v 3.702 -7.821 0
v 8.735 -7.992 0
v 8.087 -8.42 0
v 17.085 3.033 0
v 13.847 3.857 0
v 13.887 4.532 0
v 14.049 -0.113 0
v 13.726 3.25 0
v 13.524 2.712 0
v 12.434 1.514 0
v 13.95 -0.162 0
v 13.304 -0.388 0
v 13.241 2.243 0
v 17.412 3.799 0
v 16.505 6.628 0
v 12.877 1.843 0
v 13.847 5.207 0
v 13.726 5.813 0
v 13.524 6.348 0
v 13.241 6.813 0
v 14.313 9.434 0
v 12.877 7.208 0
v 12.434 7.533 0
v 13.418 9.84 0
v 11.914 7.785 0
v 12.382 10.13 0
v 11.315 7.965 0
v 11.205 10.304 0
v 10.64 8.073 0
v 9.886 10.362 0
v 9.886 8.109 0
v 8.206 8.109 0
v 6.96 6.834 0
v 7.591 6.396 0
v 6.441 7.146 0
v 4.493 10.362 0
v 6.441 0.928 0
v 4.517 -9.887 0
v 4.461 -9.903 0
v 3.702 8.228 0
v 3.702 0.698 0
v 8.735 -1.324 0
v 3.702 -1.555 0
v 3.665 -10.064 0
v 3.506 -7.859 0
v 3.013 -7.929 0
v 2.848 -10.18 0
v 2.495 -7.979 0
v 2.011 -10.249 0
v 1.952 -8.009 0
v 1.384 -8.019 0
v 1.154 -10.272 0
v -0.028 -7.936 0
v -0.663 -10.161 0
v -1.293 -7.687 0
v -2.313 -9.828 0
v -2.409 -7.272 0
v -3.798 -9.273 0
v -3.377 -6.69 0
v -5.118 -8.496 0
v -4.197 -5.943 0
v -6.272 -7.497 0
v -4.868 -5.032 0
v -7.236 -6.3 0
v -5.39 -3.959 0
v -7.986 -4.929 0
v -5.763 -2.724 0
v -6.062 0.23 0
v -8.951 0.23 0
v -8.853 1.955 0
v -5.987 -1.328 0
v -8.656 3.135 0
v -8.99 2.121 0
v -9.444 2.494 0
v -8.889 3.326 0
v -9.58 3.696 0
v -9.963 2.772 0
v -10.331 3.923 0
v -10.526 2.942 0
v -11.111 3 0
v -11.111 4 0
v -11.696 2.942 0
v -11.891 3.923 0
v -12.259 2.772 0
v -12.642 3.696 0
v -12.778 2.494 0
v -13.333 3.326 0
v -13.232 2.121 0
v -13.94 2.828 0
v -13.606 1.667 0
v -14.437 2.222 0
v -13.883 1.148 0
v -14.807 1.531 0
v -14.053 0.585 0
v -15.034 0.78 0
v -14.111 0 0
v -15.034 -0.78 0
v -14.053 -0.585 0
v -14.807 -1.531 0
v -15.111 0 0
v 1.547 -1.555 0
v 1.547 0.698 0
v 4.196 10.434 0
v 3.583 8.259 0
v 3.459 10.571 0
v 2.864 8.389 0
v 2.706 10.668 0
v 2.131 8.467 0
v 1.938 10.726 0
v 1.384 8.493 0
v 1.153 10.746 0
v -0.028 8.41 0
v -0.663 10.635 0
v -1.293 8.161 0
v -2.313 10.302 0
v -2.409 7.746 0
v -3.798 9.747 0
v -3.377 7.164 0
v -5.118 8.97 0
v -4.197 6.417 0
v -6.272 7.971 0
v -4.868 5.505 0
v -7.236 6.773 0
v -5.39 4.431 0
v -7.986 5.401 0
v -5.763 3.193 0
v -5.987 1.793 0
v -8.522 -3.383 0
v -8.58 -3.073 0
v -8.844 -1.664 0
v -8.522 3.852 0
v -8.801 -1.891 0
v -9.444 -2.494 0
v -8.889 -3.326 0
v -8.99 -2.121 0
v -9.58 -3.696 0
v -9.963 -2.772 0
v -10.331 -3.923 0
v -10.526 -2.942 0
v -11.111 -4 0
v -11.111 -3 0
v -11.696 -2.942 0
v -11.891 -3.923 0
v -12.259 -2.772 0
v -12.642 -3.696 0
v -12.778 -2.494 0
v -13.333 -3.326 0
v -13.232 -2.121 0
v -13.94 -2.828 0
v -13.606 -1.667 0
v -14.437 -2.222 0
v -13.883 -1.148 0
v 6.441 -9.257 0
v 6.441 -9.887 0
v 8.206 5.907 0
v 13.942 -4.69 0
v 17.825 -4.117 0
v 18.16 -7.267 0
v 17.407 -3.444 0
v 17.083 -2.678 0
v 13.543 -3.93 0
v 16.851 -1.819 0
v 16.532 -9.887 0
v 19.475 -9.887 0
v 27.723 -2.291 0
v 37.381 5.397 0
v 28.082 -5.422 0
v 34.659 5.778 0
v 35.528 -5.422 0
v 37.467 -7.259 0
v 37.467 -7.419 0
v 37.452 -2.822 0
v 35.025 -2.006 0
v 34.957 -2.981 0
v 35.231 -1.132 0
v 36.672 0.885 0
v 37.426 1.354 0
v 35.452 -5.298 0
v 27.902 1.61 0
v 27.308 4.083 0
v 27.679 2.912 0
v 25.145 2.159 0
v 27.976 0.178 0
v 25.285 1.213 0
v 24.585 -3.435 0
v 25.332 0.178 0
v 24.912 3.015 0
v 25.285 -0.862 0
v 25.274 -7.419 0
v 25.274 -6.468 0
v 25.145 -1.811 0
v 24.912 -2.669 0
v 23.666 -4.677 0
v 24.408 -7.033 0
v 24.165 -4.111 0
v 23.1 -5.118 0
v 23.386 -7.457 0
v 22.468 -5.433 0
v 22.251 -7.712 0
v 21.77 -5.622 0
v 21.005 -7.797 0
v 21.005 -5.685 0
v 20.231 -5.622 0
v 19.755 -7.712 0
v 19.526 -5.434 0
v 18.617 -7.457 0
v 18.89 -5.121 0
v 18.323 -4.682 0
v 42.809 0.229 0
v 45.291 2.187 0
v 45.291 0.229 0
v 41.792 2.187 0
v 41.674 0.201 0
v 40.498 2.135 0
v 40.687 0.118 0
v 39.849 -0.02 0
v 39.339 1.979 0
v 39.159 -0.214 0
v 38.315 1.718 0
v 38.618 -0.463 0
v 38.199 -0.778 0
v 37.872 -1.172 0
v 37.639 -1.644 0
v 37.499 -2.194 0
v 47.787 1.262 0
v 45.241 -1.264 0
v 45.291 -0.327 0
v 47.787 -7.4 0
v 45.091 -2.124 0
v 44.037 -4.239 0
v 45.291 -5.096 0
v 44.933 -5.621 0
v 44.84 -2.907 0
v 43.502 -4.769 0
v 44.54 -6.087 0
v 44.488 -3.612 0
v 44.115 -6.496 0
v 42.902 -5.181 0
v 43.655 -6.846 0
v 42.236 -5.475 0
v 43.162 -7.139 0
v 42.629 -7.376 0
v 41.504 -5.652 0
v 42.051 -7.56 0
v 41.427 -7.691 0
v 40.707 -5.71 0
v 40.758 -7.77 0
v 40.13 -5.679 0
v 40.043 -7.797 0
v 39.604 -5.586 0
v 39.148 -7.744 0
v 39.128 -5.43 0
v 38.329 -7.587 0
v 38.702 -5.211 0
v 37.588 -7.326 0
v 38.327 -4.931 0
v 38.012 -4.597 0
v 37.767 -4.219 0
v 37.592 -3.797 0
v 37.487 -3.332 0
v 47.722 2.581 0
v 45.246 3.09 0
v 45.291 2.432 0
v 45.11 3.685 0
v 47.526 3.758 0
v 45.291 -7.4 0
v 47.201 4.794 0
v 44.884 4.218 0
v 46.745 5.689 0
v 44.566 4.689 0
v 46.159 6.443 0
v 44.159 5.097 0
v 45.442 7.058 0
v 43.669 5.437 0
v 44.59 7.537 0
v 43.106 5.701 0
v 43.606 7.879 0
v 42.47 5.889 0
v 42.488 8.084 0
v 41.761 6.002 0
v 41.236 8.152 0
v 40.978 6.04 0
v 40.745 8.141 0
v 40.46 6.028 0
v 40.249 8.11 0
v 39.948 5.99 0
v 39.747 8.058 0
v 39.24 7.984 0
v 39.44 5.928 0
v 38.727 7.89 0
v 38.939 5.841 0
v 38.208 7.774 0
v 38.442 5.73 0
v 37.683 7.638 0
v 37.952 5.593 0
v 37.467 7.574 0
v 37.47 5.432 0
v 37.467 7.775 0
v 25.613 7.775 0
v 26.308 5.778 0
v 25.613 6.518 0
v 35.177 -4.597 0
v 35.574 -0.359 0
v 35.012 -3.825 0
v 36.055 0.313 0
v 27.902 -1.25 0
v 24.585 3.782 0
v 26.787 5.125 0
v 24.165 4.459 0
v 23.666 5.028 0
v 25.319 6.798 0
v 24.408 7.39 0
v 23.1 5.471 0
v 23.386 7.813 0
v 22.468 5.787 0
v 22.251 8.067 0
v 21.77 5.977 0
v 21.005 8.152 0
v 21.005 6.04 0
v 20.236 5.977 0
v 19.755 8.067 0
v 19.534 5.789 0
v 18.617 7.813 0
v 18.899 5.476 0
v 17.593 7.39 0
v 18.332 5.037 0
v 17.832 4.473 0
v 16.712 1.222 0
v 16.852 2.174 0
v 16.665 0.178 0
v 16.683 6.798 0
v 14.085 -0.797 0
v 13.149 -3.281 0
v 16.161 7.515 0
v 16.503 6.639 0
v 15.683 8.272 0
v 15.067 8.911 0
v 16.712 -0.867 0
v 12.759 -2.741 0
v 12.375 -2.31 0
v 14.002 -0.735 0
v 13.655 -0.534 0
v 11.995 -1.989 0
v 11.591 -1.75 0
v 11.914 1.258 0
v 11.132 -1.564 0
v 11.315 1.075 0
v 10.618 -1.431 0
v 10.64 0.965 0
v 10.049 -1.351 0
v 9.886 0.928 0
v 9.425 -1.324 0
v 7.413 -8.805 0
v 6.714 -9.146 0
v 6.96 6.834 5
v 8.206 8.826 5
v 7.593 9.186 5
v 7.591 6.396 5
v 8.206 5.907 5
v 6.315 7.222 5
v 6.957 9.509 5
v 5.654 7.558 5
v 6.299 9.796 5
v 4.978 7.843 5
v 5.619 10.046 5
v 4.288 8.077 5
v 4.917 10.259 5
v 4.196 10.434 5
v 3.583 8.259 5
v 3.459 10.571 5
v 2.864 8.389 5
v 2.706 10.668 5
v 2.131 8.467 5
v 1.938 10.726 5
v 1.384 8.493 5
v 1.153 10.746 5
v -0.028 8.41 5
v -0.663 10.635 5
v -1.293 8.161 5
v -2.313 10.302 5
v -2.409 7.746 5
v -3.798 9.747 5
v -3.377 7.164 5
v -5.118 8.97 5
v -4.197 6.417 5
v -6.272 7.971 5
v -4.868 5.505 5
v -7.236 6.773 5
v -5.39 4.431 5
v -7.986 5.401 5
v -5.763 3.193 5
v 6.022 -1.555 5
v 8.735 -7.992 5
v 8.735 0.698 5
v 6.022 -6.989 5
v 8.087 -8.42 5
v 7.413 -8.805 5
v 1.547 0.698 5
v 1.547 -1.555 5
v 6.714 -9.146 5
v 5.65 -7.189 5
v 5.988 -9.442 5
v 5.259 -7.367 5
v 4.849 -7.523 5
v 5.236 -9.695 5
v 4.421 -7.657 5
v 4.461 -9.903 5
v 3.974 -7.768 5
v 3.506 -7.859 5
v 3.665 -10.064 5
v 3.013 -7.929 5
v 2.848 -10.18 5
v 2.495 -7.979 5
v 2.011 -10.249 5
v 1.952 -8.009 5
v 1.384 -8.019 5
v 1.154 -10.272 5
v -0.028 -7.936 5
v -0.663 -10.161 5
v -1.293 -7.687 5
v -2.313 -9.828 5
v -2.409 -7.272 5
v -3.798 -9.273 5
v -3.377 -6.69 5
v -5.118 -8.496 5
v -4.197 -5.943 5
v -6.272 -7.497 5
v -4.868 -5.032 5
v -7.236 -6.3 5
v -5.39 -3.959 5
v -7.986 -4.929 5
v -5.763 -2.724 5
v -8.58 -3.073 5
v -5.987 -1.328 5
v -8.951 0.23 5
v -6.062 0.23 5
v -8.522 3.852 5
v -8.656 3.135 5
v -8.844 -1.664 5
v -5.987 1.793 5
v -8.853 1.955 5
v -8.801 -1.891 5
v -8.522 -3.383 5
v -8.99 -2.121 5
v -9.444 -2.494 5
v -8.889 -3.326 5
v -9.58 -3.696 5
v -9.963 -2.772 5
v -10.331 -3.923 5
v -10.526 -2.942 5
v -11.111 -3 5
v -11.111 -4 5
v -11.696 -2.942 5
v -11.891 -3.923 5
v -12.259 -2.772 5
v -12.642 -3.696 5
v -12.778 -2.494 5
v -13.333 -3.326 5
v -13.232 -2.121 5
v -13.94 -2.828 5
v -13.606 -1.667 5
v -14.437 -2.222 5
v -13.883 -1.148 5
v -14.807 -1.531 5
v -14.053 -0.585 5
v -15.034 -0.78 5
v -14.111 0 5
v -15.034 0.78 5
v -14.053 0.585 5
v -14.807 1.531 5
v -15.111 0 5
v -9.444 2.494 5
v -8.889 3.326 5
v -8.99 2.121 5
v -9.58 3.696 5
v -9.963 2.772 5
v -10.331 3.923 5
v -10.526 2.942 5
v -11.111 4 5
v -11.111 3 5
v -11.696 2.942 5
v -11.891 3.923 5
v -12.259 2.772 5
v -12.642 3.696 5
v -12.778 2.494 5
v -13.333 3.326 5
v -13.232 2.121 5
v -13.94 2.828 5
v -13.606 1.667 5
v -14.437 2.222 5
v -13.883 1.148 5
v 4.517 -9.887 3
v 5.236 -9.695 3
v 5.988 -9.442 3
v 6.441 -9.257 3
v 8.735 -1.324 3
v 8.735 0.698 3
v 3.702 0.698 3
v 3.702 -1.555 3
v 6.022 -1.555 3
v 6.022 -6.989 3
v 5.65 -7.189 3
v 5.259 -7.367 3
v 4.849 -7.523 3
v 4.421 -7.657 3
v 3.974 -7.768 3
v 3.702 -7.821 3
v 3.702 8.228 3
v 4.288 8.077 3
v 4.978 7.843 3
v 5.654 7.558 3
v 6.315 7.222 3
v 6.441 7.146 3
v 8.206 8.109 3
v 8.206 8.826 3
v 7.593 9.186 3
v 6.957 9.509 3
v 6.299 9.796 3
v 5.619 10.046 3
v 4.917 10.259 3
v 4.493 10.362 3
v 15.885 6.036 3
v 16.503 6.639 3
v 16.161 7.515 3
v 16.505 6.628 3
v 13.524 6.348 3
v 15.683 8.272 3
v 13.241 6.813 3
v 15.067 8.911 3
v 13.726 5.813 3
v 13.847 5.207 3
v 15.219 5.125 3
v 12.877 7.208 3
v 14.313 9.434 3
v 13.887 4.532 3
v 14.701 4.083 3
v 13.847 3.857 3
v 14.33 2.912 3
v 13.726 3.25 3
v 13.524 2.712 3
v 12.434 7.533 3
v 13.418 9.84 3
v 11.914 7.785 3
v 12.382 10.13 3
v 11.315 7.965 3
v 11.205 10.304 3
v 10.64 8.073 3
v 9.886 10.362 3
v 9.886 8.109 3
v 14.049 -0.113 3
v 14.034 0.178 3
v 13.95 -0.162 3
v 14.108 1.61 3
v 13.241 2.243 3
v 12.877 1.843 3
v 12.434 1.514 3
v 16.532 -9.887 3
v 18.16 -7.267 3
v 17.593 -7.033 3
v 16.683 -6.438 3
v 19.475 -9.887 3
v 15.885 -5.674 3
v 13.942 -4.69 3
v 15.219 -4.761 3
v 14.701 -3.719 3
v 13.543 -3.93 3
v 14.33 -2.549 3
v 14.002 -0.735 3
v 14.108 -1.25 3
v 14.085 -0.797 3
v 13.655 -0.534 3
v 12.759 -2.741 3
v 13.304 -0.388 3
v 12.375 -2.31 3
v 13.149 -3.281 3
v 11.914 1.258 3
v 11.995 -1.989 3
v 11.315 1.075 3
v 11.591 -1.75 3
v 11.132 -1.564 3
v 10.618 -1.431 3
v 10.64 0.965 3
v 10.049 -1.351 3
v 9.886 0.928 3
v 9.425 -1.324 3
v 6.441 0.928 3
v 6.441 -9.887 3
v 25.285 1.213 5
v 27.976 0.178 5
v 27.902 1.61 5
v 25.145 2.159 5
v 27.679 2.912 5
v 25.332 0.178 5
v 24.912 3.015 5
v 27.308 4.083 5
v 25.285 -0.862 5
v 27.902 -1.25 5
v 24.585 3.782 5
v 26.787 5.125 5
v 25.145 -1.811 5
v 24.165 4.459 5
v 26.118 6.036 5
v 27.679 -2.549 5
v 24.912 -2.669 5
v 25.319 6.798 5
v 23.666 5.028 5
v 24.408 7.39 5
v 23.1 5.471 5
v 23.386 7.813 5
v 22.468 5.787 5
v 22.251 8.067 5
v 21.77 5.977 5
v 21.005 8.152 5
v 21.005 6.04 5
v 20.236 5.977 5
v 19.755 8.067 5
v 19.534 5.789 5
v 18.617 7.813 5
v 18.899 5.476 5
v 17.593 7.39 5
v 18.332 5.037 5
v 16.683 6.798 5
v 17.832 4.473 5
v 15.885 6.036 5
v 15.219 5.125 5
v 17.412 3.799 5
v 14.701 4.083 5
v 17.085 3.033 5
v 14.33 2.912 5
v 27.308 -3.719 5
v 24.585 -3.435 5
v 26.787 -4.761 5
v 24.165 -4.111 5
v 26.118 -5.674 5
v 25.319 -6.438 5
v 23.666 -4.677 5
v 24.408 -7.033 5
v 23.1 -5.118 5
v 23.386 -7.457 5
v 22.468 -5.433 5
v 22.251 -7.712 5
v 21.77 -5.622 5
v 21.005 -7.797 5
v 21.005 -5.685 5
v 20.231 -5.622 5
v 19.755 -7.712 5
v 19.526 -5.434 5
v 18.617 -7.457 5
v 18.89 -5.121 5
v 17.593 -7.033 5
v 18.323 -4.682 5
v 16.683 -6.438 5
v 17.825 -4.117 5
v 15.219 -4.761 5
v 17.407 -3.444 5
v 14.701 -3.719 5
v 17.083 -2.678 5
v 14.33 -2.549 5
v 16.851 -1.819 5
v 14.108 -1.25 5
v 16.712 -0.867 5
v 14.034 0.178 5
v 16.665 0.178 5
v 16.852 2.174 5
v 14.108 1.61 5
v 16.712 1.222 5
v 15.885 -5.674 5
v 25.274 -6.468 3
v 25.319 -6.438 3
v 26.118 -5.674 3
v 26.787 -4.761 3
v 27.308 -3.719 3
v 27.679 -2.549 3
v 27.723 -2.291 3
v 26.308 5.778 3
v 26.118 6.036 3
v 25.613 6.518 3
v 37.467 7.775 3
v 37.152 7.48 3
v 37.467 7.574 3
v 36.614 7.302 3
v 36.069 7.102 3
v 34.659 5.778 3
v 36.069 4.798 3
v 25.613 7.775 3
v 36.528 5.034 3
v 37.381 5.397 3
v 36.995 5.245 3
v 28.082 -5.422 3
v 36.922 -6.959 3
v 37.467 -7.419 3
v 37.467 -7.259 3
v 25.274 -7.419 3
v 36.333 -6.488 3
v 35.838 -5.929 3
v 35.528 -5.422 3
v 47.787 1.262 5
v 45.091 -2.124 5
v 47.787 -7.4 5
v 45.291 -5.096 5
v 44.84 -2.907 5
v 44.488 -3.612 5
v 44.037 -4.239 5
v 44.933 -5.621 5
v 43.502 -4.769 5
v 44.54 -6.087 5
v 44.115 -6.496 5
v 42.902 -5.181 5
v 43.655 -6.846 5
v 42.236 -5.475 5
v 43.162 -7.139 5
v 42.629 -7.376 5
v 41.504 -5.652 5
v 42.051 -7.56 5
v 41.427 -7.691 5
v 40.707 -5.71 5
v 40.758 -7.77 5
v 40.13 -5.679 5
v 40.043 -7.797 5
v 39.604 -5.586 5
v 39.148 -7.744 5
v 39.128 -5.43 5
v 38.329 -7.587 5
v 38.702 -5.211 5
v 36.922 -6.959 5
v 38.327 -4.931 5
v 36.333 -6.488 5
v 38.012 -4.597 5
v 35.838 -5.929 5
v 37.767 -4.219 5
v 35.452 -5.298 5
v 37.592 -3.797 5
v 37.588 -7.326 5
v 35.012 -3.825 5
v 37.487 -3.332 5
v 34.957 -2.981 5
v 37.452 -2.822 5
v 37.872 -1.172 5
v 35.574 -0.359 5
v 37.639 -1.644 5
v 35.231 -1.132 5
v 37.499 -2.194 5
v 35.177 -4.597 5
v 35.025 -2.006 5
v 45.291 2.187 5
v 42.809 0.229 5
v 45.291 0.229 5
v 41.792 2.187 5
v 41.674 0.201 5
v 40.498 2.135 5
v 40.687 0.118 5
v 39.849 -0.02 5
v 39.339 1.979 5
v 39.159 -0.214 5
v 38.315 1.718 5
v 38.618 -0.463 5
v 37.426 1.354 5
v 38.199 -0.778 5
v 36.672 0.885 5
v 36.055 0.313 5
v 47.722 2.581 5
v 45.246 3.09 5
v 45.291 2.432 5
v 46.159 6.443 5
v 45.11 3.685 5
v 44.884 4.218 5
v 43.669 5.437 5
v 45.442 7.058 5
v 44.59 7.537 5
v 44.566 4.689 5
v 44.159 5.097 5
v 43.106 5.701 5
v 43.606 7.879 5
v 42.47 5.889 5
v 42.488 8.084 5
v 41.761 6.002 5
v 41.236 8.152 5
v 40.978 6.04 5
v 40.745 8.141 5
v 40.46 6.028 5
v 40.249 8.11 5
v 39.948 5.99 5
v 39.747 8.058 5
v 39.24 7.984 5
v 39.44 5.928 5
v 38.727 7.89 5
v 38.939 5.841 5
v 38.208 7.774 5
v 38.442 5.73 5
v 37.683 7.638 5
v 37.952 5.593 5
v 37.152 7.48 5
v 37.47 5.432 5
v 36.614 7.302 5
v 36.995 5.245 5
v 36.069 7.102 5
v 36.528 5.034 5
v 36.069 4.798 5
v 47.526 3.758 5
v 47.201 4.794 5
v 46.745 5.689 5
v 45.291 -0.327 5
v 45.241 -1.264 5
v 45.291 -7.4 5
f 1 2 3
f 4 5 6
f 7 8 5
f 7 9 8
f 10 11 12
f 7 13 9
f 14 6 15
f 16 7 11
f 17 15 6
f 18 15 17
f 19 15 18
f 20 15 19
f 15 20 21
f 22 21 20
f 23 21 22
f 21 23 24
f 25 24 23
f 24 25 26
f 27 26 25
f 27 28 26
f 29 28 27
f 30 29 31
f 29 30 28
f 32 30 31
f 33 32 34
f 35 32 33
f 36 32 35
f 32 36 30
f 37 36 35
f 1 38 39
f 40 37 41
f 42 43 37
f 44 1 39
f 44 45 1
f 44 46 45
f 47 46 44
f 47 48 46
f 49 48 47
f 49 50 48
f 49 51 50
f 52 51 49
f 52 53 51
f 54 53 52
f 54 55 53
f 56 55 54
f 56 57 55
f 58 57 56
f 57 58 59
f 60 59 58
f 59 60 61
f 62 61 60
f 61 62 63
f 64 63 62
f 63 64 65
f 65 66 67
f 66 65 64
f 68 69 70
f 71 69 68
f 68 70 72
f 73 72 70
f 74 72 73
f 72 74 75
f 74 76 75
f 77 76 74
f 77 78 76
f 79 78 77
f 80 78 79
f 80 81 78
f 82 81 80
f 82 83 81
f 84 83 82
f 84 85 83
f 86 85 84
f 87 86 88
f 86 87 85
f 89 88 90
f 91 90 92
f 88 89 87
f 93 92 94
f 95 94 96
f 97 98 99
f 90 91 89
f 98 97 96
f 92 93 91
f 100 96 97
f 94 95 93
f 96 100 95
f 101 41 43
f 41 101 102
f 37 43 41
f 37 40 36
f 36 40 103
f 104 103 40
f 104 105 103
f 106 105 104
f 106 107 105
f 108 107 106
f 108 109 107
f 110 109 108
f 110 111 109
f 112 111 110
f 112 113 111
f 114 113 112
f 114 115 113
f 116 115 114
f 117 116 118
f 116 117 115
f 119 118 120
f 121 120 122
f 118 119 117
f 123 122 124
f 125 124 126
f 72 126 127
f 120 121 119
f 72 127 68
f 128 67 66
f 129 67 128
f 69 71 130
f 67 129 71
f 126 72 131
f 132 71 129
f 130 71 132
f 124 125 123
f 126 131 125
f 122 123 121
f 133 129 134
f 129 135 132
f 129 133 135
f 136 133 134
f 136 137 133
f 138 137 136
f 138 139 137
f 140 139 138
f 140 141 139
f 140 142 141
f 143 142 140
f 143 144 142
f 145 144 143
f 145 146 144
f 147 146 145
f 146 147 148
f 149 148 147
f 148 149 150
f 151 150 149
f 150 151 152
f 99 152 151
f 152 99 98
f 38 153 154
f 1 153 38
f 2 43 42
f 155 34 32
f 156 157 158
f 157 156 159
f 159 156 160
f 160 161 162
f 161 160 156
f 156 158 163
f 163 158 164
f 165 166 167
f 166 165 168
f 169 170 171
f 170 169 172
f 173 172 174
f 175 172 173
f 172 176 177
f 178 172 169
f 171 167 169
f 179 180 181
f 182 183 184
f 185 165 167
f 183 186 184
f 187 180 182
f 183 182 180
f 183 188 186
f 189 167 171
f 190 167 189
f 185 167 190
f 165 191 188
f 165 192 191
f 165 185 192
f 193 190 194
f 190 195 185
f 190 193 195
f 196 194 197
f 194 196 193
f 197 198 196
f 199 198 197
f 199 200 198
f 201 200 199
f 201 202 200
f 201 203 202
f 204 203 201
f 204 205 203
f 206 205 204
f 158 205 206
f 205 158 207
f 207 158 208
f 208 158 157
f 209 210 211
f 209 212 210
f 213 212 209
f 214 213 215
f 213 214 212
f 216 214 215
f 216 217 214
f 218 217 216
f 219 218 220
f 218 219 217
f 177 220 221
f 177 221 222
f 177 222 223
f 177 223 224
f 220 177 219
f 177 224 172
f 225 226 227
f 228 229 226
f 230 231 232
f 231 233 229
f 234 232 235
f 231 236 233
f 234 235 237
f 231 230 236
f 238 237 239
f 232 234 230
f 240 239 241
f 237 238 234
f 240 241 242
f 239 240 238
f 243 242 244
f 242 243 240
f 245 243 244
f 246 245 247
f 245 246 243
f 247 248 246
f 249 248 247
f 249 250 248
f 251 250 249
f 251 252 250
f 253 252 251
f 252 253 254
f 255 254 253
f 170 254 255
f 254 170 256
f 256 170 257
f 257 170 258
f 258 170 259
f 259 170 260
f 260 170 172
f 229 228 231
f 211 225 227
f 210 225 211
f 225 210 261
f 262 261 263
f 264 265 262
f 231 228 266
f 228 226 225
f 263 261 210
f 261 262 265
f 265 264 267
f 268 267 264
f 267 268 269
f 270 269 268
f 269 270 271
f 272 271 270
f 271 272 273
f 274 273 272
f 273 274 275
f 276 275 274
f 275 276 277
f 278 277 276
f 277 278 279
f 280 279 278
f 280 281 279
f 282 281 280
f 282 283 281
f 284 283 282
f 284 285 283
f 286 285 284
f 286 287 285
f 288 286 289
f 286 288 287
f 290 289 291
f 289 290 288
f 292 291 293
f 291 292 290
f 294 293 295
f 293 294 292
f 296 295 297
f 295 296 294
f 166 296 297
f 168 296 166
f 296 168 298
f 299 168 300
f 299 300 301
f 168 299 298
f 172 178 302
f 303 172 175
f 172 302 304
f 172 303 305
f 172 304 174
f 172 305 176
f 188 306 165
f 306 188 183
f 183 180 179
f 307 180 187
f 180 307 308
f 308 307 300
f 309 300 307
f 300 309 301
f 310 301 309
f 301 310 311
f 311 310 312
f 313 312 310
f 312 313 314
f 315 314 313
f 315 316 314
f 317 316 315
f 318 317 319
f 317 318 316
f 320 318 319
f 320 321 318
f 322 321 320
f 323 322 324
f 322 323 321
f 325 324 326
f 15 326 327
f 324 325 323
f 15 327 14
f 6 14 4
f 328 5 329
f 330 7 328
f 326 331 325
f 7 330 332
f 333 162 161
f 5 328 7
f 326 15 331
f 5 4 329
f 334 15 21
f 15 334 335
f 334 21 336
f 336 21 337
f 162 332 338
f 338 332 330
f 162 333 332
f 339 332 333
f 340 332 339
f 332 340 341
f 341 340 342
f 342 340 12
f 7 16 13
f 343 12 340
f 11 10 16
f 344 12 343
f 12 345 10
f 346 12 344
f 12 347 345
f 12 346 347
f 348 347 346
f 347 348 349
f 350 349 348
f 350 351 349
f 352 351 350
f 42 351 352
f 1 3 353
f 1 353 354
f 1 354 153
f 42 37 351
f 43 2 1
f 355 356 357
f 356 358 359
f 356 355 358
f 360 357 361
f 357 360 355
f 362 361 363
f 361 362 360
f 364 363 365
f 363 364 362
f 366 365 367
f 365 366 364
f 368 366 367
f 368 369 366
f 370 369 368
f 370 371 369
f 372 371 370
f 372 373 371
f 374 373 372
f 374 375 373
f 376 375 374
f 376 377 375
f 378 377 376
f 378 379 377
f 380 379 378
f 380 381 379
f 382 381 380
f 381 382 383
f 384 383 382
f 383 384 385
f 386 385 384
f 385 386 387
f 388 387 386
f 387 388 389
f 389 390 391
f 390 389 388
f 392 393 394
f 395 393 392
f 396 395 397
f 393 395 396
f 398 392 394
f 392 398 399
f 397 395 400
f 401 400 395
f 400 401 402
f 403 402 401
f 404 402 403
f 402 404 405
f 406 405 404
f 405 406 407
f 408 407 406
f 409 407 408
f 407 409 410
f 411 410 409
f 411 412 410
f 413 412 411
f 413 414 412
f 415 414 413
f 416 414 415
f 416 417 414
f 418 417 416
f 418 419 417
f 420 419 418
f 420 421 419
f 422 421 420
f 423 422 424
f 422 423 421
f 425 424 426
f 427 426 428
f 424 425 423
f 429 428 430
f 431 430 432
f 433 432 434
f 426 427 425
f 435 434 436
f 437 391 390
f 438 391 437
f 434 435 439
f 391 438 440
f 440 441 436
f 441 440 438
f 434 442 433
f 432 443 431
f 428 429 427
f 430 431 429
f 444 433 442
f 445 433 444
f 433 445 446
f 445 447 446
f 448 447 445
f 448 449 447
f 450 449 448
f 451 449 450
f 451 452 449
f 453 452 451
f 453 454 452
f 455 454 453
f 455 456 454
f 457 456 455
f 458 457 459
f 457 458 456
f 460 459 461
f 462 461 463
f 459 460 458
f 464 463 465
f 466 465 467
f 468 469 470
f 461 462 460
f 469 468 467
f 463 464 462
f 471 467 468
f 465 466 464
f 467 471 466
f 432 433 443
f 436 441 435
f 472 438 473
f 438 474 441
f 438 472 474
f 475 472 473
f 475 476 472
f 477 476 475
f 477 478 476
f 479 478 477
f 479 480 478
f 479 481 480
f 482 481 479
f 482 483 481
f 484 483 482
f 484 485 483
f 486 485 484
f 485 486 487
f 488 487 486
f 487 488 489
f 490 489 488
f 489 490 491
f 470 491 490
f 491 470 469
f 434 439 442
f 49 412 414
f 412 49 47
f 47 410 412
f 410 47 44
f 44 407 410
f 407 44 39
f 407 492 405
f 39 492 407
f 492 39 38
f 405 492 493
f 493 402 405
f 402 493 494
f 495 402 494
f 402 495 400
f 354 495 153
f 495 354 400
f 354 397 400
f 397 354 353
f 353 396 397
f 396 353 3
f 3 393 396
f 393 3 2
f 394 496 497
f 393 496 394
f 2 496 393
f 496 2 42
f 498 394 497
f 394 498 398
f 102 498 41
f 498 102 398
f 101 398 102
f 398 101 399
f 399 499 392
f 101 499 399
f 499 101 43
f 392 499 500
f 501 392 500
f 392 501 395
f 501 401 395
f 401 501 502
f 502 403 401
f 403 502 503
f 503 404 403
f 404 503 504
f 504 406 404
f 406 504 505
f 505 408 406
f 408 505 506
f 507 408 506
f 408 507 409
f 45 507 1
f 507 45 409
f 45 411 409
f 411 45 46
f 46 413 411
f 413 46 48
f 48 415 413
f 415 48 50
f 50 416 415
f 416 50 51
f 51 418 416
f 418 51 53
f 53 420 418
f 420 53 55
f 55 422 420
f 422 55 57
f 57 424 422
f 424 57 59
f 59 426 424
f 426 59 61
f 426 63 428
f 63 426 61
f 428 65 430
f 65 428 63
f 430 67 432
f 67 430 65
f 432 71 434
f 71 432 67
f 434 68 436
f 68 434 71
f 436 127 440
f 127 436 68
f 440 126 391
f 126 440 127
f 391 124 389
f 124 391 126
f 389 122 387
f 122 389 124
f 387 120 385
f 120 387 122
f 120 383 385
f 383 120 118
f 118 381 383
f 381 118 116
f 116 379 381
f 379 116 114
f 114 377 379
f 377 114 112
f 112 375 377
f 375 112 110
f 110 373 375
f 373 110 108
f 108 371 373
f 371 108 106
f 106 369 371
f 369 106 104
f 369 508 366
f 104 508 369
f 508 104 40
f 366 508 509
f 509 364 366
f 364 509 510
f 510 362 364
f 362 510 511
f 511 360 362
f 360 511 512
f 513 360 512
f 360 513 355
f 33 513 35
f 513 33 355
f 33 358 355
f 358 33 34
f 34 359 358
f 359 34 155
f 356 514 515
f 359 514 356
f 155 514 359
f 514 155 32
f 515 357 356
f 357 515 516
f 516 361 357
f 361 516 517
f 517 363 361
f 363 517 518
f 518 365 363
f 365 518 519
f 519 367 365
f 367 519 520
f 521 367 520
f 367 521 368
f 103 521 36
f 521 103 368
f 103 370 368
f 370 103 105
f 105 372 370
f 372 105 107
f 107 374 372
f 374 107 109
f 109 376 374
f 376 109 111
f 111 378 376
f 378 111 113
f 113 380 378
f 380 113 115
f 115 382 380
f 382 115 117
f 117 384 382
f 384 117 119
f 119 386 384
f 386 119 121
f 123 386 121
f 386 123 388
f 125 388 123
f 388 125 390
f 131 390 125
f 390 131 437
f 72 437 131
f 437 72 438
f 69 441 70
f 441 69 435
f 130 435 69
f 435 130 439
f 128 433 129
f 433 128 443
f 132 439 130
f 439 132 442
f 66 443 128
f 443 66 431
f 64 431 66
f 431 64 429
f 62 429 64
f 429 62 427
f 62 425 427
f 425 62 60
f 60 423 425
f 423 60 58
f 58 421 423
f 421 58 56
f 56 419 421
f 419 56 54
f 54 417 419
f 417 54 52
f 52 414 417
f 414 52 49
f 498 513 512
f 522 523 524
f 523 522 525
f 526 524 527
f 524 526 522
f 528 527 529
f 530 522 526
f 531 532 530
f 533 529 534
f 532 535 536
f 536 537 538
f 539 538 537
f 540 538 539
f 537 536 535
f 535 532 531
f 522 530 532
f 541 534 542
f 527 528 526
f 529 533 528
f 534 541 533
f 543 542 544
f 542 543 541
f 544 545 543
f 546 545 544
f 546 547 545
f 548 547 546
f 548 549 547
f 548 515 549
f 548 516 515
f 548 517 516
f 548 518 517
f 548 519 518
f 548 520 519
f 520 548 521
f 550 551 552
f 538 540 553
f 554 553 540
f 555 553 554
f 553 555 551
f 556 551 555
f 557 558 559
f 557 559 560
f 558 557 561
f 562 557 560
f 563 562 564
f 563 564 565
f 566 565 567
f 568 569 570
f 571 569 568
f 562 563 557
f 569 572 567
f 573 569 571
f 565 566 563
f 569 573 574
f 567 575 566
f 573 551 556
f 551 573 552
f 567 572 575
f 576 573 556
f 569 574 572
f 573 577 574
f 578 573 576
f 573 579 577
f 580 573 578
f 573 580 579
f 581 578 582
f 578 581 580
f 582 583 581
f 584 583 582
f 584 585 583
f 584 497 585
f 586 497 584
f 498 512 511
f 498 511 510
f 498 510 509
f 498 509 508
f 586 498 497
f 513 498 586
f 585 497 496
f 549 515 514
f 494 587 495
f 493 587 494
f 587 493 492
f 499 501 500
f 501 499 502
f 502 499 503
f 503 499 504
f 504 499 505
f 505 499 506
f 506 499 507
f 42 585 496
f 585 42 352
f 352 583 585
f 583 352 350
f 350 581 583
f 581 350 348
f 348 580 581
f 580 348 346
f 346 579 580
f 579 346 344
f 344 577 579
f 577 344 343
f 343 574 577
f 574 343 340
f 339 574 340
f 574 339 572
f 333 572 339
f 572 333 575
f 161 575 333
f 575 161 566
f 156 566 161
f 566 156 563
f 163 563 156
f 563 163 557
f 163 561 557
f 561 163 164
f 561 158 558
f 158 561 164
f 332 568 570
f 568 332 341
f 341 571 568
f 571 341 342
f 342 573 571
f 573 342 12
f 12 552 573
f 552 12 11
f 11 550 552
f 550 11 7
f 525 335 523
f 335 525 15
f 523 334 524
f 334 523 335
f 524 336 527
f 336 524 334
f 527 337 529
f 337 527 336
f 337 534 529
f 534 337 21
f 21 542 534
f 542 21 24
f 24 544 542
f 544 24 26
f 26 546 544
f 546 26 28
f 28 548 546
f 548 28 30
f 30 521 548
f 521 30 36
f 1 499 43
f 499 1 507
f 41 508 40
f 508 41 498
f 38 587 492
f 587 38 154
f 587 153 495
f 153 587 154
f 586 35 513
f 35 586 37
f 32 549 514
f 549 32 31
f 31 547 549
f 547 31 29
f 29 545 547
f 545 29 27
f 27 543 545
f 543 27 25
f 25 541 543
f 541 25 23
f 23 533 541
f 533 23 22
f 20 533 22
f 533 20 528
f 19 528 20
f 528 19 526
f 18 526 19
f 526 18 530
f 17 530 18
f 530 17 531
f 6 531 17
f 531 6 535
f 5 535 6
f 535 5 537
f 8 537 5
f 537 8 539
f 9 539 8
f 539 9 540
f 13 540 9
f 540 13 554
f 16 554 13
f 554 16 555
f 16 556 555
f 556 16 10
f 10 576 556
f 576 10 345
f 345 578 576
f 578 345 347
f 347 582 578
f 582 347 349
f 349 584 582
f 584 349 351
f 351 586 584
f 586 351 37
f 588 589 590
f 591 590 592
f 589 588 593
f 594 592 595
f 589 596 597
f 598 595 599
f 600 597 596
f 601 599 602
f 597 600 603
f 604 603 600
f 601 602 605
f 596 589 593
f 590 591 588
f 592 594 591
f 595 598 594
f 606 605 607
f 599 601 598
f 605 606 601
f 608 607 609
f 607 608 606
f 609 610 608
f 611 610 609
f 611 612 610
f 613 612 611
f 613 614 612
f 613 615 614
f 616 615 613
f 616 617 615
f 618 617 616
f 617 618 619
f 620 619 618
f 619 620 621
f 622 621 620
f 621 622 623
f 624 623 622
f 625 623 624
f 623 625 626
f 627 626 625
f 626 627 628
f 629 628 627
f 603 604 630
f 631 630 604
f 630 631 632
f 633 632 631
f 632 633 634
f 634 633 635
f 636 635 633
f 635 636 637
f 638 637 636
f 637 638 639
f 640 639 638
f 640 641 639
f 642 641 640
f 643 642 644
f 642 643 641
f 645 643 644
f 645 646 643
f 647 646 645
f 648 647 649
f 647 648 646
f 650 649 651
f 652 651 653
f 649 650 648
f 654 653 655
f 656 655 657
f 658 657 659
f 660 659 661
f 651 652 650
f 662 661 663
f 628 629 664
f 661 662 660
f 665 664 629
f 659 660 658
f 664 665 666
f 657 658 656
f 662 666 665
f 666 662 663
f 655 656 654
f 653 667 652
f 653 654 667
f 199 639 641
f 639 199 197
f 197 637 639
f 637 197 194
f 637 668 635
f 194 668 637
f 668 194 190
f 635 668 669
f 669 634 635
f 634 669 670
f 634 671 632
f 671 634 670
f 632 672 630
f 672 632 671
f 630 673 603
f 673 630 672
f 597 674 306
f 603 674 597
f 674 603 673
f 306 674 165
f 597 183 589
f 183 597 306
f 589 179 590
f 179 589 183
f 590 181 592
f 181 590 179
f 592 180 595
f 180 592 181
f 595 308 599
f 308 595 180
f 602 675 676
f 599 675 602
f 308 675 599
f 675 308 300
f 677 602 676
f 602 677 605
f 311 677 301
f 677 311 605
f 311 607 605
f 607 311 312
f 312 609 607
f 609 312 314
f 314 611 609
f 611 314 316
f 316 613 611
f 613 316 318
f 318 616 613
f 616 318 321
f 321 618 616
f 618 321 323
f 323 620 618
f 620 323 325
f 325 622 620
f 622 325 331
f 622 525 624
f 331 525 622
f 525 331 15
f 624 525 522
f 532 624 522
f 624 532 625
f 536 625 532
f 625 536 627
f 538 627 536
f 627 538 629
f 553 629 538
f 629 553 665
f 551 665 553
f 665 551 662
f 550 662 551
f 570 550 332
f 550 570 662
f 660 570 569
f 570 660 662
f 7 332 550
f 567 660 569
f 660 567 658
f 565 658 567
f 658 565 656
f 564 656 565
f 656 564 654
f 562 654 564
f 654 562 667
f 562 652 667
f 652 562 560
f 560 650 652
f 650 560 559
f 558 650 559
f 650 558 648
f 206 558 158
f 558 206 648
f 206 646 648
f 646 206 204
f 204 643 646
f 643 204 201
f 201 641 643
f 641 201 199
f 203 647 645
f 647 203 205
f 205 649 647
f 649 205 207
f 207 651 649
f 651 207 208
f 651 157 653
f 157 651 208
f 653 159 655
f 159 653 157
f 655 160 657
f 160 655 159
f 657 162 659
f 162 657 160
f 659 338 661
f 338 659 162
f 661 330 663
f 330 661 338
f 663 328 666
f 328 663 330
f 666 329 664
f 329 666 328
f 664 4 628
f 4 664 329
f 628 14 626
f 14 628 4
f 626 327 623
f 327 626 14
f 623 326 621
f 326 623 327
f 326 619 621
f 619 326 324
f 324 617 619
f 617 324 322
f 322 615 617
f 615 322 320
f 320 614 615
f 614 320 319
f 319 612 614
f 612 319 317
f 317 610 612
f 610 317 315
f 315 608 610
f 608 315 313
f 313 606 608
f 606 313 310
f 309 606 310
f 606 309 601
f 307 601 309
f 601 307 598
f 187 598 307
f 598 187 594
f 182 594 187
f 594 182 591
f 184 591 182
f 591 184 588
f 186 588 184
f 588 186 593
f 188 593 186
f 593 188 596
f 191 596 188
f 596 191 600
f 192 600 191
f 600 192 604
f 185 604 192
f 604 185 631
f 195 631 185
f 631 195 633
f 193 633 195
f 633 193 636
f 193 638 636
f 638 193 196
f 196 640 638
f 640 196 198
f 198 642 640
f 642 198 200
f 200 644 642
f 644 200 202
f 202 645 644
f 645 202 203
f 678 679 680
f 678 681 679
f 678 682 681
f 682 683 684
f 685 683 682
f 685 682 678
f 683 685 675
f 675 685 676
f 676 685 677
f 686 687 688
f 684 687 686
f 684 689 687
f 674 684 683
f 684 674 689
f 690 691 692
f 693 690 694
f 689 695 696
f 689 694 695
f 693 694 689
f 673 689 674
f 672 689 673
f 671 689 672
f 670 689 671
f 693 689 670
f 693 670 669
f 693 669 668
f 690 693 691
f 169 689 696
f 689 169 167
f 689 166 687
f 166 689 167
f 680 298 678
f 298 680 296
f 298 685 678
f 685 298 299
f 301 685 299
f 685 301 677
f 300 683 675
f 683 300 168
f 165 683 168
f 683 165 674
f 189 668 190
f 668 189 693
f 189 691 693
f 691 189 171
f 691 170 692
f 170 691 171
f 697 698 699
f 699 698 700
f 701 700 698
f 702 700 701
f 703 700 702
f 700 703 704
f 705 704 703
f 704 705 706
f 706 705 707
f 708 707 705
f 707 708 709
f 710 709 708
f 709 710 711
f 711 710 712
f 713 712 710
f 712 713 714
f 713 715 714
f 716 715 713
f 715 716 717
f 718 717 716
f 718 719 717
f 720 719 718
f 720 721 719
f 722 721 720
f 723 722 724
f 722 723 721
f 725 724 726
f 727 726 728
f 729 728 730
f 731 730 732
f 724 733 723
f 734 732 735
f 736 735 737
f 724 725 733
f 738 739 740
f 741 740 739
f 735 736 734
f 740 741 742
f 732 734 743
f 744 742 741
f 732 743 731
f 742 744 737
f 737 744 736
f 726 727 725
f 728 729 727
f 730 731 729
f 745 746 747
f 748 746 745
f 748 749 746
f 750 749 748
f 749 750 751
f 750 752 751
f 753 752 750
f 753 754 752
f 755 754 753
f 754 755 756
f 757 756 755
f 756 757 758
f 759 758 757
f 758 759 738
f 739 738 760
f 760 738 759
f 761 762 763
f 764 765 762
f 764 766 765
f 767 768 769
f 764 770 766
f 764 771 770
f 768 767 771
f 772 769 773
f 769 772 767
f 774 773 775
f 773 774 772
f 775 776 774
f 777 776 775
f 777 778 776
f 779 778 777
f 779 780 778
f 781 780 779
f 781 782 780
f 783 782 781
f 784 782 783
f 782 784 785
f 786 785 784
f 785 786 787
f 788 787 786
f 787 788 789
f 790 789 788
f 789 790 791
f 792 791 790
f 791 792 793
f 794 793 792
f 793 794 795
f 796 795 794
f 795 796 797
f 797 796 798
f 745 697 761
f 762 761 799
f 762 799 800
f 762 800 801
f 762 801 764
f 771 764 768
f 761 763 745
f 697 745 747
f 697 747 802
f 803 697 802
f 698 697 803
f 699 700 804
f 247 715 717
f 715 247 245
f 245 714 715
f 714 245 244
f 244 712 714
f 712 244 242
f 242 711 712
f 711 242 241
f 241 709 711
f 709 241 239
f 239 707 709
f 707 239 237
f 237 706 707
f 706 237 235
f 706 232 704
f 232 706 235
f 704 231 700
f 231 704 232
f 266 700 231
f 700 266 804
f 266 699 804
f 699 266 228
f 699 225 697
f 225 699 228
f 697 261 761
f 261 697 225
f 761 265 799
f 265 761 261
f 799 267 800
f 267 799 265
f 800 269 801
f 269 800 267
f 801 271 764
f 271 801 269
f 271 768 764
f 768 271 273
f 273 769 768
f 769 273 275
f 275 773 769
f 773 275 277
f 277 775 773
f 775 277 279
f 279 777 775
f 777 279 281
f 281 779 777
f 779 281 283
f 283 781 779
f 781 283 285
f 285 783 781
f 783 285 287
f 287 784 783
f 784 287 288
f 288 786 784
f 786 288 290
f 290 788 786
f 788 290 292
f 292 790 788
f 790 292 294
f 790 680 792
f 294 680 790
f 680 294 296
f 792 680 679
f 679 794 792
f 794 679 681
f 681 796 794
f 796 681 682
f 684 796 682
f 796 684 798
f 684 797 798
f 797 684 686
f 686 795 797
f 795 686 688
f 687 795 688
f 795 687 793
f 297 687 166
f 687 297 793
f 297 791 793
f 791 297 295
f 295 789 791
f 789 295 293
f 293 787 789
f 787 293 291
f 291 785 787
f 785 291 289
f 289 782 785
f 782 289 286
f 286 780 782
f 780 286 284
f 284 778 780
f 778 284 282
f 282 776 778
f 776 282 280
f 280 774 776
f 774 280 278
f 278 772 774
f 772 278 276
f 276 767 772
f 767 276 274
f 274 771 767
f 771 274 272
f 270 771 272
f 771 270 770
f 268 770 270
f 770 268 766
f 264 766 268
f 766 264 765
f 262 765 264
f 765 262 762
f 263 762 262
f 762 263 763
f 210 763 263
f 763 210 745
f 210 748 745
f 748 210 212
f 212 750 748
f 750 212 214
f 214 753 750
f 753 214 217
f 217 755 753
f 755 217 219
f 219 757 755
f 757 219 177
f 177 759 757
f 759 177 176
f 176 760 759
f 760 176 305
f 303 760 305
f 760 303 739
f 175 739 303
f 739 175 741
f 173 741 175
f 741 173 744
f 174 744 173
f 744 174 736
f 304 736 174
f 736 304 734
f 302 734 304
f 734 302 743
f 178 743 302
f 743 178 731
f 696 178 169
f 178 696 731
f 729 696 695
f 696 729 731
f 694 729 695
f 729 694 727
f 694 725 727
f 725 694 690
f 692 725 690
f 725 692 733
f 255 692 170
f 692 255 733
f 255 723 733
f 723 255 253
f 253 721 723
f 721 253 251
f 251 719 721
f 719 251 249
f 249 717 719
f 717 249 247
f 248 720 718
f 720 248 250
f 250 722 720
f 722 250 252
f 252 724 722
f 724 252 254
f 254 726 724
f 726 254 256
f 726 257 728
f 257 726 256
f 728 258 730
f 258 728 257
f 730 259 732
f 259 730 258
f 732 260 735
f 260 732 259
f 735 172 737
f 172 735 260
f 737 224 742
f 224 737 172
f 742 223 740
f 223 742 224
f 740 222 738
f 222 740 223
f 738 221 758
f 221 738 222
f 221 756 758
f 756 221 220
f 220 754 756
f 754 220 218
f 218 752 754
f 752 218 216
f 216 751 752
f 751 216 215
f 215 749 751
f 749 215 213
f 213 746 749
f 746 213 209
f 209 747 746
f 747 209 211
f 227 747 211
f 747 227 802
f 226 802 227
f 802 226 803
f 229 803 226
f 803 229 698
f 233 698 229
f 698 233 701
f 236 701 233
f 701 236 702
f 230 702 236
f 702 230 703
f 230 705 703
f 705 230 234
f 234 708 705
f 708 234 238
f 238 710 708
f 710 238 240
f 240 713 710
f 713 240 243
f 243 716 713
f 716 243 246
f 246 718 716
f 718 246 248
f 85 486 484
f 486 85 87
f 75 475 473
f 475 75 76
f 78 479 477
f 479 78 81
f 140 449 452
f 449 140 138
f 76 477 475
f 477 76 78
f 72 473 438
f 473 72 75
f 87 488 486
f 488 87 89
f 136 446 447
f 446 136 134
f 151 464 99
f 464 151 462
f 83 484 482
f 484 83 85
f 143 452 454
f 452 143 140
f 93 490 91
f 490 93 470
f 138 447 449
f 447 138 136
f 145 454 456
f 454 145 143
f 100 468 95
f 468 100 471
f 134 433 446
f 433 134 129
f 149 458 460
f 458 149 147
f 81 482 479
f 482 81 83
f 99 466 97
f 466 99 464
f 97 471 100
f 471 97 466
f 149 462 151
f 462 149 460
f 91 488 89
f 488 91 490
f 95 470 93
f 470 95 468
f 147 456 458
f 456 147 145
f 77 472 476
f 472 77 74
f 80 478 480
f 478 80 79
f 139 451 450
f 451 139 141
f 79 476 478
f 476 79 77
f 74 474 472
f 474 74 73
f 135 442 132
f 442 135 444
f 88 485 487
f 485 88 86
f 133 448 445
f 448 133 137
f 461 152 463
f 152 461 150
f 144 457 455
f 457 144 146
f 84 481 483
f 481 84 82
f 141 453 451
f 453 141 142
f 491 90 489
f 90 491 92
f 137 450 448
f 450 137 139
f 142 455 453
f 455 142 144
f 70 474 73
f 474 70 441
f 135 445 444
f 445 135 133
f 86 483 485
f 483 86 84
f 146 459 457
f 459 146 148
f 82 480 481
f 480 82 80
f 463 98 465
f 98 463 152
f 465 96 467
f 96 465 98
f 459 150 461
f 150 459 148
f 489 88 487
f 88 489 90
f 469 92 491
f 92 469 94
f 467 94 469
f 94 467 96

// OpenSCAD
text="GRoza";
n=4;
size_symbol=20;
char_scale = 0.52;
height_symbol=5;
delta_z = 2;
fo = "Courier New; Style = Bold";
$fn=32;


for ( j = [0:1:n] ){
  he = height_symbol - (j % 2) * delta_z;
  // td = fontmetrics( font = fo, size = size_symbol );

  translate([size_symbol*char_scale*j,0,0])
     linear_extrude(height = he )
        text( text[j], font = fo, size = size_symbol, valign = "center", halign = "center");
}



translate([-size_symbol/1.8,0,height_symbol/2]){
    difference(){
        cylinder(h=height_symbol, r=4,center=true);
        cylinder(h=height_symbol+1, r=3,center=true);
    }
}
